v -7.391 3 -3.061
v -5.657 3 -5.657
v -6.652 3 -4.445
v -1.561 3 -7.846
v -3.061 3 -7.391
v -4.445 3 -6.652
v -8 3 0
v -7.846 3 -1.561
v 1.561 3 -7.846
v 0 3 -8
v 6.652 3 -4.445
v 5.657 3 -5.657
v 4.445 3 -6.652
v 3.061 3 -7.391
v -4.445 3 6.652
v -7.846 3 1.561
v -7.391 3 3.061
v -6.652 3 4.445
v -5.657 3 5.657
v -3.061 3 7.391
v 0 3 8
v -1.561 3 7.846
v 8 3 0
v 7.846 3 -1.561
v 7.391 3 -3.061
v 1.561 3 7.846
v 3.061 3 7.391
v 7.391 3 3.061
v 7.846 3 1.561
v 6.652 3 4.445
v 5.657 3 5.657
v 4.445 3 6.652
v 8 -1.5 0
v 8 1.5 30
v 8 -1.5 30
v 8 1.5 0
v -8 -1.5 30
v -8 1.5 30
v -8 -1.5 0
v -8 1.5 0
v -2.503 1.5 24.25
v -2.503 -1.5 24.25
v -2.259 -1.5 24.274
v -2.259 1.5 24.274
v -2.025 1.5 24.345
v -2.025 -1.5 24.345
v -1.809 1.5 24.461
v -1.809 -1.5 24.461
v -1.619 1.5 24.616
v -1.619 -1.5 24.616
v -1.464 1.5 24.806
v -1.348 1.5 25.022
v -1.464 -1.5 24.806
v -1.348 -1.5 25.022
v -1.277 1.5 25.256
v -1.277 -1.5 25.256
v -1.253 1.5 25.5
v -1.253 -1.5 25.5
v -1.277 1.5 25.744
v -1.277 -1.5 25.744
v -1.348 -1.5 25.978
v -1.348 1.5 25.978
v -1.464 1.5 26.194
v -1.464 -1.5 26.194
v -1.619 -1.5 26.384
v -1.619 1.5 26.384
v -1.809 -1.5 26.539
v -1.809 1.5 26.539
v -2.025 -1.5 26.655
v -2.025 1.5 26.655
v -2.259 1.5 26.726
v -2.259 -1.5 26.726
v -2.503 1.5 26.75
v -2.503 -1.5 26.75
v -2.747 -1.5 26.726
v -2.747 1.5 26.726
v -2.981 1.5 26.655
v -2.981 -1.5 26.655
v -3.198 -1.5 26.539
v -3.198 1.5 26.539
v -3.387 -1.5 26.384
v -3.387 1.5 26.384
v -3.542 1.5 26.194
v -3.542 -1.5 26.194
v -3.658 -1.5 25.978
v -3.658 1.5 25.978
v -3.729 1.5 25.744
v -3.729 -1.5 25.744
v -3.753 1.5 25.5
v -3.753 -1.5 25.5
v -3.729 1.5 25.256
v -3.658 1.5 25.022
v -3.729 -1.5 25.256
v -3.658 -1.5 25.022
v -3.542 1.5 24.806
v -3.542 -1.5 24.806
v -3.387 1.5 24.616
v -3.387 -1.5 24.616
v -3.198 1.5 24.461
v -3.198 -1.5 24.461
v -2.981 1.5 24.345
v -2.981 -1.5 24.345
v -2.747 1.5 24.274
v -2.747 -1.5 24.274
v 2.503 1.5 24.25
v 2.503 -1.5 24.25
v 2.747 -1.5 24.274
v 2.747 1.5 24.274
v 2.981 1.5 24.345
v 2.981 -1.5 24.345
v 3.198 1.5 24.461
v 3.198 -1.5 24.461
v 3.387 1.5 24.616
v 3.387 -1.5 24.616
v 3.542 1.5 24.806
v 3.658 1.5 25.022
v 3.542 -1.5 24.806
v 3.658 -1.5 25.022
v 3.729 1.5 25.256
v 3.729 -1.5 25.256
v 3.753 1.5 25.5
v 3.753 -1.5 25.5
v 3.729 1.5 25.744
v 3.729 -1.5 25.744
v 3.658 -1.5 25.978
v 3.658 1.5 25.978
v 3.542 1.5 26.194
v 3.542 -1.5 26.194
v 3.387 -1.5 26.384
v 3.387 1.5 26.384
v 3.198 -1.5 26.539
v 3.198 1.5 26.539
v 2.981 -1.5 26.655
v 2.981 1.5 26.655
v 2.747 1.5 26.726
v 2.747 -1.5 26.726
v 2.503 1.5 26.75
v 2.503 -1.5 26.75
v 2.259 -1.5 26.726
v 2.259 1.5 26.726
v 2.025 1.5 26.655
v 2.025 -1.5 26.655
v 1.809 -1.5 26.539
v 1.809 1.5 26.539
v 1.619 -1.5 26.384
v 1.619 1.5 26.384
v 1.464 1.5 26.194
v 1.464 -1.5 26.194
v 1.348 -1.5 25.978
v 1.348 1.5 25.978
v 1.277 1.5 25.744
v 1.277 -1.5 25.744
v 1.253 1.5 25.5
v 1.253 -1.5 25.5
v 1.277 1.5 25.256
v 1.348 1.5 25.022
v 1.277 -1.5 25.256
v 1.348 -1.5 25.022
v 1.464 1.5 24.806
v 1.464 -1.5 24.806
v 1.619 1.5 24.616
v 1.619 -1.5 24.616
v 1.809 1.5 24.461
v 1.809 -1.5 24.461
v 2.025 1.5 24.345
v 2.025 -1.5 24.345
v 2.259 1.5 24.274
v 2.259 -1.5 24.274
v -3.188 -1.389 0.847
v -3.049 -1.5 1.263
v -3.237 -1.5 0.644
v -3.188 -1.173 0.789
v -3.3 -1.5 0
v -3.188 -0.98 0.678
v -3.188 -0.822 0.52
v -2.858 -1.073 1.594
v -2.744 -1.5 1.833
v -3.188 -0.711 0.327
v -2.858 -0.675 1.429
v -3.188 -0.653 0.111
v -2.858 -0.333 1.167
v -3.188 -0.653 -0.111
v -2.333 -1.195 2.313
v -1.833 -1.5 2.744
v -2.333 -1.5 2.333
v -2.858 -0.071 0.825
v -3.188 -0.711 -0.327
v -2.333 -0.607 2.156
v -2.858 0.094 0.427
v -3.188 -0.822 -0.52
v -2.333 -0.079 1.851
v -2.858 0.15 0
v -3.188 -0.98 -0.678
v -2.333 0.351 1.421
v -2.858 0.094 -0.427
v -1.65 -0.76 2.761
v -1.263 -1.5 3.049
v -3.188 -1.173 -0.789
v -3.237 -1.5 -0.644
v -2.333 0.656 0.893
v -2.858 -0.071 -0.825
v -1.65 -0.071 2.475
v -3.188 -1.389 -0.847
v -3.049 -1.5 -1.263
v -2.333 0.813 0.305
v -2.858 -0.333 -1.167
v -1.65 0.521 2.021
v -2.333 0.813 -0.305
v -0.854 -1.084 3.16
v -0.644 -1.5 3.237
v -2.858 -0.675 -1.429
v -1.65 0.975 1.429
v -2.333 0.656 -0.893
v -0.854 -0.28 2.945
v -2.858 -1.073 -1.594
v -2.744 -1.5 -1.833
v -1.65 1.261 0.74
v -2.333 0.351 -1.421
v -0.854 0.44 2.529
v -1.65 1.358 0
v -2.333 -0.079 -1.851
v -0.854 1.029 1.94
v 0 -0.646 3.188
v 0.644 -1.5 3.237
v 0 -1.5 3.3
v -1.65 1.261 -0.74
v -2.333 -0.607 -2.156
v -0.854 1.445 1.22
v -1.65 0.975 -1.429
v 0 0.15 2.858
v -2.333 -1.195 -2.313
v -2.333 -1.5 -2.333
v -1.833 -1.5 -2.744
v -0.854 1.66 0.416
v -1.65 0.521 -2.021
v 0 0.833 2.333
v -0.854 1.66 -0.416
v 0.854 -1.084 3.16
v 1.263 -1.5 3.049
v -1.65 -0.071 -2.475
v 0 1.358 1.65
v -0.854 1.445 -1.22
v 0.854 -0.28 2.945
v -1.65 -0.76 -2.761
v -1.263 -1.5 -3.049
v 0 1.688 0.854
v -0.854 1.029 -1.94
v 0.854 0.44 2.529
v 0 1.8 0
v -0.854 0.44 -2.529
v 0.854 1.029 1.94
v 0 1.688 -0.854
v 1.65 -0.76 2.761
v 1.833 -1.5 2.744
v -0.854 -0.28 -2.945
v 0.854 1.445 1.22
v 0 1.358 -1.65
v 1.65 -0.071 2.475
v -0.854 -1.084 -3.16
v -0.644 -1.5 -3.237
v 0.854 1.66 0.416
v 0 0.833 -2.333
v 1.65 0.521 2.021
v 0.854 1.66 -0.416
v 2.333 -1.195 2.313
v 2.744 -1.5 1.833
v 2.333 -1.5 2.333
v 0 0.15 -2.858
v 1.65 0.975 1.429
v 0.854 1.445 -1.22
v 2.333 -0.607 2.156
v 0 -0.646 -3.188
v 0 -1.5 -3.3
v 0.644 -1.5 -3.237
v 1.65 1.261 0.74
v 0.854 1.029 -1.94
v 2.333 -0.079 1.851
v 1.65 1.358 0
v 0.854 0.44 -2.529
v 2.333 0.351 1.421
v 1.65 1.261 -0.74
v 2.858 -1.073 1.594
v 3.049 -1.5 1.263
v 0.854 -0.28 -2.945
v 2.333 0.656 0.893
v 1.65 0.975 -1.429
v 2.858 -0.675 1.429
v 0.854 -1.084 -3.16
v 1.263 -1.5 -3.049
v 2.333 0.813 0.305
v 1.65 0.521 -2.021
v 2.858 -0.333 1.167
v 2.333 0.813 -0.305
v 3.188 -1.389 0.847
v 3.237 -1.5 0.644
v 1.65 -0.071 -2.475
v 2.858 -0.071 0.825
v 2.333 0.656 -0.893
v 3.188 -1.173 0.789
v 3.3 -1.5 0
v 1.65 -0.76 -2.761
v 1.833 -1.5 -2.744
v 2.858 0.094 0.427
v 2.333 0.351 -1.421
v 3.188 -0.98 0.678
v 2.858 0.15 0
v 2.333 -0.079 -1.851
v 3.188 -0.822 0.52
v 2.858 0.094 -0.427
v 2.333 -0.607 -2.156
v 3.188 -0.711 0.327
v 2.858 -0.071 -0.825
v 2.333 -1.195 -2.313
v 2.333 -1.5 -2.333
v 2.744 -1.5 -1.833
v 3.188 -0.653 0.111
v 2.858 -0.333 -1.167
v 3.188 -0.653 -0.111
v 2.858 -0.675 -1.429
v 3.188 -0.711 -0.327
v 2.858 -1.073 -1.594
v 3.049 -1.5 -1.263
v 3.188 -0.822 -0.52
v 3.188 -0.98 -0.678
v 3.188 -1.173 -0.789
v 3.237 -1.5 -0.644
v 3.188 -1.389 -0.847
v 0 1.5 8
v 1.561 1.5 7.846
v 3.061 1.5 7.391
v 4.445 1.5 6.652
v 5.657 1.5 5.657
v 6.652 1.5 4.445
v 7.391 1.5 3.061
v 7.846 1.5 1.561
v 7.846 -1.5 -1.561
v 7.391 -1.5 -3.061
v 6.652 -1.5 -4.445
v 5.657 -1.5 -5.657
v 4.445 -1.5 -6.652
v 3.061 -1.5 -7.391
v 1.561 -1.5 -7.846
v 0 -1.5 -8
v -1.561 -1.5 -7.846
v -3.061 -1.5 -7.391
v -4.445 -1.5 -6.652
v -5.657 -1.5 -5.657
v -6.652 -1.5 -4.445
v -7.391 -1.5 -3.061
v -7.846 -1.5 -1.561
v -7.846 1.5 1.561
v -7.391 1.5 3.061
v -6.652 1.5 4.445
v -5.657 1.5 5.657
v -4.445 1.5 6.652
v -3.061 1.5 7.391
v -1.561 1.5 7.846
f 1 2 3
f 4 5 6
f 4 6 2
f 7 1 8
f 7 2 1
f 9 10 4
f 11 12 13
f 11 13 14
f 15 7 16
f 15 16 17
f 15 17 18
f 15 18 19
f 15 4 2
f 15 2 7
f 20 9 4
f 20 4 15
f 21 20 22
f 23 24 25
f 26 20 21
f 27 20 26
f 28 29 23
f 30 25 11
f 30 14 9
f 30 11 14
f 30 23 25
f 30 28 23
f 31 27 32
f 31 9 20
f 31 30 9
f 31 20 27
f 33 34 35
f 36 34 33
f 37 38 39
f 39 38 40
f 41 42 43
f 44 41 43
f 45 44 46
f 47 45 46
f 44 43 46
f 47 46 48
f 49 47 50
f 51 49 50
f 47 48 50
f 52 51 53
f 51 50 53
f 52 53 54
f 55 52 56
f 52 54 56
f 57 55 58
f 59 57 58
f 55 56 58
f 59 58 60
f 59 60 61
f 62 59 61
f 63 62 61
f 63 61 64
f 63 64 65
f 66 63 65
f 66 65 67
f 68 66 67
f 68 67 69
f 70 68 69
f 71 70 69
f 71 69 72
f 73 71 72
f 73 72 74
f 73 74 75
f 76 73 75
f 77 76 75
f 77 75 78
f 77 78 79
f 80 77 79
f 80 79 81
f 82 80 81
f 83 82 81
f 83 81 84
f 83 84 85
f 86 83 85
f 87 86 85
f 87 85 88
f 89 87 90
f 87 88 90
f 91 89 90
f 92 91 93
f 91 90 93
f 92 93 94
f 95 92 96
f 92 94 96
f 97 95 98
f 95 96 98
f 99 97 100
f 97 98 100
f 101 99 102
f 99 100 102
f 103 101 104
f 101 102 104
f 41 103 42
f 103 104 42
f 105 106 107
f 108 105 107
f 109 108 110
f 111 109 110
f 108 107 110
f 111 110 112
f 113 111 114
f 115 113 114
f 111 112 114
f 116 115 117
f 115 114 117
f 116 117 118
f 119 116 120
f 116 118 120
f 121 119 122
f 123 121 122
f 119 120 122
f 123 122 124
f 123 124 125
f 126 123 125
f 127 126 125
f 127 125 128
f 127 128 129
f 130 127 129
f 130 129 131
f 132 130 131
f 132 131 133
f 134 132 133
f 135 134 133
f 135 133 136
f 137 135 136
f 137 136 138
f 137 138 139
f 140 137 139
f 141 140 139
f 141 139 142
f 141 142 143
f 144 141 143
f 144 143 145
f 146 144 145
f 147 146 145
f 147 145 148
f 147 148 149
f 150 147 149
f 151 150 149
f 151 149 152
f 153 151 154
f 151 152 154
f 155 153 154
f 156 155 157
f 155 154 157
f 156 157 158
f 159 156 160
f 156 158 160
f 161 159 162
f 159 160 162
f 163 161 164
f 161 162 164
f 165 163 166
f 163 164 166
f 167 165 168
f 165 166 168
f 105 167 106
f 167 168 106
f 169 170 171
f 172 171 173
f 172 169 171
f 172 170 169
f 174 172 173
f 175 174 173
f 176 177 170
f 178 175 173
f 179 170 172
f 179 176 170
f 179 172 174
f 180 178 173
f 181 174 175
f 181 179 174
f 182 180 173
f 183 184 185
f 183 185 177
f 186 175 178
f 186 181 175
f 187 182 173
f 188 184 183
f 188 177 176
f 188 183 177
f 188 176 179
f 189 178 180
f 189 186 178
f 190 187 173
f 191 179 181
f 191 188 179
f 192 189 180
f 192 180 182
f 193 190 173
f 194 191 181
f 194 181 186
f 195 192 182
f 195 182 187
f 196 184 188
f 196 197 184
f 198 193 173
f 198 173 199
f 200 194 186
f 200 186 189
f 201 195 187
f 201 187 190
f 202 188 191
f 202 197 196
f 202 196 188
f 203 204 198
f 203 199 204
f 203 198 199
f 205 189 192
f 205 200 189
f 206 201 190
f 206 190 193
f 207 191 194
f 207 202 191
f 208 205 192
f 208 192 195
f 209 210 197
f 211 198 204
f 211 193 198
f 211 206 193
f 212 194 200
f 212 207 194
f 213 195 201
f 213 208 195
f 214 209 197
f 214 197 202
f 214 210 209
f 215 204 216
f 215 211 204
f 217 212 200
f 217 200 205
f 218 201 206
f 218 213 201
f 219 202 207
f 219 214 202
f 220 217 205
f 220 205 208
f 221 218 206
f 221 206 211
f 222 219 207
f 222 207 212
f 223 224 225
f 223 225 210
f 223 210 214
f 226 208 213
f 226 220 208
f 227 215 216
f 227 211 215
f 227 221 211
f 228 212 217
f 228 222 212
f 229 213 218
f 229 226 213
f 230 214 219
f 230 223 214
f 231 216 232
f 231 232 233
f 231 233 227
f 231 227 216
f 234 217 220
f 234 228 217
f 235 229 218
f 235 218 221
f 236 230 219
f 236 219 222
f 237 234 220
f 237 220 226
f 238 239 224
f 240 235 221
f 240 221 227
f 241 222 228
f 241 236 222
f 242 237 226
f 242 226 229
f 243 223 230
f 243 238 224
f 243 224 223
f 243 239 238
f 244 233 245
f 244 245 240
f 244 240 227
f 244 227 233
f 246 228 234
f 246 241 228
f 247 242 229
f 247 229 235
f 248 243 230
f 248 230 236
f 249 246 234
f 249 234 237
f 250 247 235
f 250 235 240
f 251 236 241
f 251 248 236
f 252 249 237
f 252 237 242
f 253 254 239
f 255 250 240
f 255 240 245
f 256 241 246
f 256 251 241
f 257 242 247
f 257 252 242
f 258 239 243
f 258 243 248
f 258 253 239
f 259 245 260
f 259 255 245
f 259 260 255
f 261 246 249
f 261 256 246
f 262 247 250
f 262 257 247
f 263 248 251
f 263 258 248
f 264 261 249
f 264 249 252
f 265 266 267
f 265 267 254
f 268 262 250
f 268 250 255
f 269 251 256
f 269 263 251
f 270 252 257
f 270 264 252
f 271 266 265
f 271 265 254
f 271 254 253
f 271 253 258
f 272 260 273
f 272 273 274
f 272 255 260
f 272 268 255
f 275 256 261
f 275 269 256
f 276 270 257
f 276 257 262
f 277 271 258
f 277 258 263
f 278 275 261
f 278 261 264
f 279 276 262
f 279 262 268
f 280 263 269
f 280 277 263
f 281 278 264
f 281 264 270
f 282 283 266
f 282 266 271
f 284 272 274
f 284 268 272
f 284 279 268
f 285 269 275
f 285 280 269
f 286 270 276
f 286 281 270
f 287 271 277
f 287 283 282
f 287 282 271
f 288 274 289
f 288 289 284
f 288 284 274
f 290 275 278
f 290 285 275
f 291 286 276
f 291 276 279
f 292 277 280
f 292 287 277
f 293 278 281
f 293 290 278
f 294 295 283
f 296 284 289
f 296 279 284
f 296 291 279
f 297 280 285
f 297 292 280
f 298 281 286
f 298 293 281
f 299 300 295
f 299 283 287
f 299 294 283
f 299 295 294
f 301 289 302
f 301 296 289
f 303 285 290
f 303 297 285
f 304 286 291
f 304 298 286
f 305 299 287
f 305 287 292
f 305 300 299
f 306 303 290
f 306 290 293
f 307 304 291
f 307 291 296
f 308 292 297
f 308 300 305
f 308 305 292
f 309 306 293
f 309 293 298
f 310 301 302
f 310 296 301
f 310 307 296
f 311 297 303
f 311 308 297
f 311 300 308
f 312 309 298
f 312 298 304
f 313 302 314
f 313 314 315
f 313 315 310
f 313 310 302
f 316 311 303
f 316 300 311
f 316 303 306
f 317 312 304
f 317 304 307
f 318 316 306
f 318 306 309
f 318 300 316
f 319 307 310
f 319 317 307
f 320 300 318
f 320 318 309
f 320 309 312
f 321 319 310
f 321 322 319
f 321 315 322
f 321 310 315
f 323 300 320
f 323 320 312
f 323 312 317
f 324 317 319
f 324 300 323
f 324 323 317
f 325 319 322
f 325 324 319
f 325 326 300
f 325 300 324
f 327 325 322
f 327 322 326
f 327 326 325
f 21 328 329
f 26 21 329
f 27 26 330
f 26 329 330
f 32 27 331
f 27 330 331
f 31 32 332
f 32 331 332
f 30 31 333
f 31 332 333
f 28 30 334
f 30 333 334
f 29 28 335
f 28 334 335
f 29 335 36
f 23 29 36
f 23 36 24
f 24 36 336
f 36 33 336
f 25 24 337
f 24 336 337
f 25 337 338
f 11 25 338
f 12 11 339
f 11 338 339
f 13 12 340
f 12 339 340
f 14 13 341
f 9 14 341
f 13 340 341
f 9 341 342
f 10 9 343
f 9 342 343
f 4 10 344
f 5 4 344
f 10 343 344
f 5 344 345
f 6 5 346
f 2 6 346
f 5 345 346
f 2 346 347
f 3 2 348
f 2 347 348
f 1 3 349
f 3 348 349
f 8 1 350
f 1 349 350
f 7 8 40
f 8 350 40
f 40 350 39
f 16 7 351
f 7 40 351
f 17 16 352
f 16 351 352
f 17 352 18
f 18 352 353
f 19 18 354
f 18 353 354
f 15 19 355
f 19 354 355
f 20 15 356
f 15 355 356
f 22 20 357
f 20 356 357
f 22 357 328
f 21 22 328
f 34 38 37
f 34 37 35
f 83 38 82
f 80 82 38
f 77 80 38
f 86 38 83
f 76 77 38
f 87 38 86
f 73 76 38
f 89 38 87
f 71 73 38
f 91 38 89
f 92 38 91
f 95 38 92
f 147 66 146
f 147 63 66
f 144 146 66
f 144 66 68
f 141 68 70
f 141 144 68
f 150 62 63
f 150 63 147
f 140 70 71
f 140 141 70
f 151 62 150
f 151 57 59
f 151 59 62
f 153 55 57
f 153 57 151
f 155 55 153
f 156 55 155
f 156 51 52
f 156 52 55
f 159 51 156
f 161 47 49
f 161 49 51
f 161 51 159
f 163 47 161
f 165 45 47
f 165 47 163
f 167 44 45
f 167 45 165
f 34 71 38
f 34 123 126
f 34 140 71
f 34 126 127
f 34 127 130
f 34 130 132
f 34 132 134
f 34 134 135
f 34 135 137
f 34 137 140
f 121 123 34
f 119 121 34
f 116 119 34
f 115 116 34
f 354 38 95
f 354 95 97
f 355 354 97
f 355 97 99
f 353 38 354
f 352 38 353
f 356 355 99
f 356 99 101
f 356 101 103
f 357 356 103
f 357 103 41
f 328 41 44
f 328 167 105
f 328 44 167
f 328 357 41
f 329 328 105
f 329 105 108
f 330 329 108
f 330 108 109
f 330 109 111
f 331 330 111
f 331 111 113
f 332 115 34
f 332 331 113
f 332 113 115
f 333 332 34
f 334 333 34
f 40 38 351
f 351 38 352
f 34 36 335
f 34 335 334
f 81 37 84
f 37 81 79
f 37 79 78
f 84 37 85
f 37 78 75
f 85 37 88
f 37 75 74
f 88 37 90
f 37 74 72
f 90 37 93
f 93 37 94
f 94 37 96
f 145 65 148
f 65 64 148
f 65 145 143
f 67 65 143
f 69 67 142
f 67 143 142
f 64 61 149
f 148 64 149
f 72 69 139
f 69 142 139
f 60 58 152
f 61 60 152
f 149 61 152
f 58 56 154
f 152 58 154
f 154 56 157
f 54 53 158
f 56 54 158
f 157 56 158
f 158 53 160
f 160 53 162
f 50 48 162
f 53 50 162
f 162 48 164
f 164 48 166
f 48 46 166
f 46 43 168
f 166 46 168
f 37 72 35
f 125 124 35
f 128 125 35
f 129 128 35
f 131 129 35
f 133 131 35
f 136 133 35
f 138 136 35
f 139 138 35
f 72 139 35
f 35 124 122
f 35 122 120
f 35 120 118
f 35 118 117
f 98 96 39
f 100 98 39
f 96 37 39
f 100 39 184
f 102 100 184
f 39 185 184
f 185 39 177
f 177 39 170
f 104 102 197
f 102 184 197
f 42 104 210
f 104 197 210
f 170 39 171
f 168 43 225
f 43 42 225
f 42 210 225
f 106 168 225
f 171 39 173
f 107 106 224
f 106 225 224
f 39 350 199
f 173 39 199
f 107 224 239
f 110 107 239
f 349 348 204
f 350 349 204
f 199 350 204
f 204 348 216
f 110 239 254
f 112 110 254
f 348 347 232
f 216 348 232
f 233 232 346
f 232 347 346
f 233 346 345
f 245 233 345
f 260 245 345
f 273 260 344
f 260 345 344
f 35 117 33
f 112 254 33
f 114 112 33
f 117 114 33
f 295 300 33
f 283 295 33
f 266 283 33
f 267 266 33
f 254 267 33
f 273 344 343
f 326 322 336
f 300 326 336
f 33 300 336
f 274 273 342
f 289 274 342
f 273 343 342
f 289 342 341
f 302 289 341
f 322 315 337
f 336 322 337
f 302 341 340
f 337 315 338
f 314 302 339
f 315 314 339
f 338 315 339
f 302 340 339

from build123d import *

# Parameters (mm, degrees)
BOSS_EXTRUDE1_DEPTH      = 3
BOSS_EXTRUDE1_DEPTH_BACK = 1.5
SKETCH1_R                = 8
SKETCH2_W                = 16
SKETCH2_H                = 30
BOSS_EXTRUDE2_DEPTH      = 1.5
CUT_EXTRUDE1_REACH       = 33.373
SKETCH3_R                = 1.25


with BuildPart() as part:
    # Sketch1 → Boss-Extrude1 (new, two sides: drawn at the far end of the back side and taken through both)
    with BuildSketch(Plane(origin=(0, 0, 0), x_dir=(1, 0, 0), z_dir=(0, 1, 0)).offset(-BOSS_EXTRUDE1_DEPTH_BACK)):
        Circle(SKETCH1_R)
    extrude(amount=BOSS_EXTRUDE1_DEPTH + BOSS_EXTRUDE1_DEPTH_BACK)

    # Sketch2 → Boss-Extrude2 (add, symmetric)
    with BuildSketch(Plane(origin=(0, 0, 0), x_dir=(1, 0, 0), z_dir=(0, 1, 0))):
        with Locations((0, -15)):
            Rectangle(SKETCH2_W, SKETCH2_H)
    extrude(amount=BOSS_EXTRUDE2_DEPTH, both=True)

    # Sketch3 → Cut-Extrude1 (cut, up to next)
    with BuildSketch(Plane(origin=(0, -1.5, 0), x_dir=(-1, 0, 0), z_dir=(0, -1, 0)), mode=Mode.PRIVATE) as cut_extrude1_sk1:
        with Locations((2.503073418, -25.5)):
            Circle(SKETCH3_R)
    cut_extrude1_tool1 = extrude(cut_extrude1_sk1.sketch, amount=-CUT_EXTRUDE1_REACH, mode=Mode.PRIVATE) & part.part
    # Sketch3 → Cut-Extrude1 (cut, up to next)
    with BuildSketch(Plane(origin=(0, -1.5, 0), x_dir=(-1, 0, 0), z_dir=(0, -1, 0)), mode=Mode.PRIVATE) as cut_extrude1_sk2:
        with Locations((-2.503073418, -25.5)):
            Circle(SKETCH3_R)
    cut_extrude1_tool2 = extrude(cut_extrude1_sk2.sketch, amount=-CUT_EXTRUDE1_REACH, mode=Mode.PRIVATE) & part.part
    add(cut_extrude1_tool1.solids().sort_by_distance((-2.503073, -1.5, 25.5))[0], mode=Mode.SUBTRACT)
    add(cut_extrude1_tool2.solids().sort_by_distance((2.503073, -1.5, 25.5))[0], mode=Mode.SUBTRACT)

    # Sketch4 → Cut-Revolve21 (revolve, cut)
    with BuildSketch(Plane(origin=(0, -1.5, 0), x_dir=(-1, 0, 0), z_dir=(0, -1, 0))):
        with BuildLine():
            Line((3.3, 0), (-3.3, 0))
            ThreePointArc((-3.3, 0), (0, -3.3), (3.3, 0))
        make_face()
    revolve(axis=Axis((3.3, -1.5, 0), (-1, 0, 0)), mode=Mode.SUBTRACT)


solid = part.part
